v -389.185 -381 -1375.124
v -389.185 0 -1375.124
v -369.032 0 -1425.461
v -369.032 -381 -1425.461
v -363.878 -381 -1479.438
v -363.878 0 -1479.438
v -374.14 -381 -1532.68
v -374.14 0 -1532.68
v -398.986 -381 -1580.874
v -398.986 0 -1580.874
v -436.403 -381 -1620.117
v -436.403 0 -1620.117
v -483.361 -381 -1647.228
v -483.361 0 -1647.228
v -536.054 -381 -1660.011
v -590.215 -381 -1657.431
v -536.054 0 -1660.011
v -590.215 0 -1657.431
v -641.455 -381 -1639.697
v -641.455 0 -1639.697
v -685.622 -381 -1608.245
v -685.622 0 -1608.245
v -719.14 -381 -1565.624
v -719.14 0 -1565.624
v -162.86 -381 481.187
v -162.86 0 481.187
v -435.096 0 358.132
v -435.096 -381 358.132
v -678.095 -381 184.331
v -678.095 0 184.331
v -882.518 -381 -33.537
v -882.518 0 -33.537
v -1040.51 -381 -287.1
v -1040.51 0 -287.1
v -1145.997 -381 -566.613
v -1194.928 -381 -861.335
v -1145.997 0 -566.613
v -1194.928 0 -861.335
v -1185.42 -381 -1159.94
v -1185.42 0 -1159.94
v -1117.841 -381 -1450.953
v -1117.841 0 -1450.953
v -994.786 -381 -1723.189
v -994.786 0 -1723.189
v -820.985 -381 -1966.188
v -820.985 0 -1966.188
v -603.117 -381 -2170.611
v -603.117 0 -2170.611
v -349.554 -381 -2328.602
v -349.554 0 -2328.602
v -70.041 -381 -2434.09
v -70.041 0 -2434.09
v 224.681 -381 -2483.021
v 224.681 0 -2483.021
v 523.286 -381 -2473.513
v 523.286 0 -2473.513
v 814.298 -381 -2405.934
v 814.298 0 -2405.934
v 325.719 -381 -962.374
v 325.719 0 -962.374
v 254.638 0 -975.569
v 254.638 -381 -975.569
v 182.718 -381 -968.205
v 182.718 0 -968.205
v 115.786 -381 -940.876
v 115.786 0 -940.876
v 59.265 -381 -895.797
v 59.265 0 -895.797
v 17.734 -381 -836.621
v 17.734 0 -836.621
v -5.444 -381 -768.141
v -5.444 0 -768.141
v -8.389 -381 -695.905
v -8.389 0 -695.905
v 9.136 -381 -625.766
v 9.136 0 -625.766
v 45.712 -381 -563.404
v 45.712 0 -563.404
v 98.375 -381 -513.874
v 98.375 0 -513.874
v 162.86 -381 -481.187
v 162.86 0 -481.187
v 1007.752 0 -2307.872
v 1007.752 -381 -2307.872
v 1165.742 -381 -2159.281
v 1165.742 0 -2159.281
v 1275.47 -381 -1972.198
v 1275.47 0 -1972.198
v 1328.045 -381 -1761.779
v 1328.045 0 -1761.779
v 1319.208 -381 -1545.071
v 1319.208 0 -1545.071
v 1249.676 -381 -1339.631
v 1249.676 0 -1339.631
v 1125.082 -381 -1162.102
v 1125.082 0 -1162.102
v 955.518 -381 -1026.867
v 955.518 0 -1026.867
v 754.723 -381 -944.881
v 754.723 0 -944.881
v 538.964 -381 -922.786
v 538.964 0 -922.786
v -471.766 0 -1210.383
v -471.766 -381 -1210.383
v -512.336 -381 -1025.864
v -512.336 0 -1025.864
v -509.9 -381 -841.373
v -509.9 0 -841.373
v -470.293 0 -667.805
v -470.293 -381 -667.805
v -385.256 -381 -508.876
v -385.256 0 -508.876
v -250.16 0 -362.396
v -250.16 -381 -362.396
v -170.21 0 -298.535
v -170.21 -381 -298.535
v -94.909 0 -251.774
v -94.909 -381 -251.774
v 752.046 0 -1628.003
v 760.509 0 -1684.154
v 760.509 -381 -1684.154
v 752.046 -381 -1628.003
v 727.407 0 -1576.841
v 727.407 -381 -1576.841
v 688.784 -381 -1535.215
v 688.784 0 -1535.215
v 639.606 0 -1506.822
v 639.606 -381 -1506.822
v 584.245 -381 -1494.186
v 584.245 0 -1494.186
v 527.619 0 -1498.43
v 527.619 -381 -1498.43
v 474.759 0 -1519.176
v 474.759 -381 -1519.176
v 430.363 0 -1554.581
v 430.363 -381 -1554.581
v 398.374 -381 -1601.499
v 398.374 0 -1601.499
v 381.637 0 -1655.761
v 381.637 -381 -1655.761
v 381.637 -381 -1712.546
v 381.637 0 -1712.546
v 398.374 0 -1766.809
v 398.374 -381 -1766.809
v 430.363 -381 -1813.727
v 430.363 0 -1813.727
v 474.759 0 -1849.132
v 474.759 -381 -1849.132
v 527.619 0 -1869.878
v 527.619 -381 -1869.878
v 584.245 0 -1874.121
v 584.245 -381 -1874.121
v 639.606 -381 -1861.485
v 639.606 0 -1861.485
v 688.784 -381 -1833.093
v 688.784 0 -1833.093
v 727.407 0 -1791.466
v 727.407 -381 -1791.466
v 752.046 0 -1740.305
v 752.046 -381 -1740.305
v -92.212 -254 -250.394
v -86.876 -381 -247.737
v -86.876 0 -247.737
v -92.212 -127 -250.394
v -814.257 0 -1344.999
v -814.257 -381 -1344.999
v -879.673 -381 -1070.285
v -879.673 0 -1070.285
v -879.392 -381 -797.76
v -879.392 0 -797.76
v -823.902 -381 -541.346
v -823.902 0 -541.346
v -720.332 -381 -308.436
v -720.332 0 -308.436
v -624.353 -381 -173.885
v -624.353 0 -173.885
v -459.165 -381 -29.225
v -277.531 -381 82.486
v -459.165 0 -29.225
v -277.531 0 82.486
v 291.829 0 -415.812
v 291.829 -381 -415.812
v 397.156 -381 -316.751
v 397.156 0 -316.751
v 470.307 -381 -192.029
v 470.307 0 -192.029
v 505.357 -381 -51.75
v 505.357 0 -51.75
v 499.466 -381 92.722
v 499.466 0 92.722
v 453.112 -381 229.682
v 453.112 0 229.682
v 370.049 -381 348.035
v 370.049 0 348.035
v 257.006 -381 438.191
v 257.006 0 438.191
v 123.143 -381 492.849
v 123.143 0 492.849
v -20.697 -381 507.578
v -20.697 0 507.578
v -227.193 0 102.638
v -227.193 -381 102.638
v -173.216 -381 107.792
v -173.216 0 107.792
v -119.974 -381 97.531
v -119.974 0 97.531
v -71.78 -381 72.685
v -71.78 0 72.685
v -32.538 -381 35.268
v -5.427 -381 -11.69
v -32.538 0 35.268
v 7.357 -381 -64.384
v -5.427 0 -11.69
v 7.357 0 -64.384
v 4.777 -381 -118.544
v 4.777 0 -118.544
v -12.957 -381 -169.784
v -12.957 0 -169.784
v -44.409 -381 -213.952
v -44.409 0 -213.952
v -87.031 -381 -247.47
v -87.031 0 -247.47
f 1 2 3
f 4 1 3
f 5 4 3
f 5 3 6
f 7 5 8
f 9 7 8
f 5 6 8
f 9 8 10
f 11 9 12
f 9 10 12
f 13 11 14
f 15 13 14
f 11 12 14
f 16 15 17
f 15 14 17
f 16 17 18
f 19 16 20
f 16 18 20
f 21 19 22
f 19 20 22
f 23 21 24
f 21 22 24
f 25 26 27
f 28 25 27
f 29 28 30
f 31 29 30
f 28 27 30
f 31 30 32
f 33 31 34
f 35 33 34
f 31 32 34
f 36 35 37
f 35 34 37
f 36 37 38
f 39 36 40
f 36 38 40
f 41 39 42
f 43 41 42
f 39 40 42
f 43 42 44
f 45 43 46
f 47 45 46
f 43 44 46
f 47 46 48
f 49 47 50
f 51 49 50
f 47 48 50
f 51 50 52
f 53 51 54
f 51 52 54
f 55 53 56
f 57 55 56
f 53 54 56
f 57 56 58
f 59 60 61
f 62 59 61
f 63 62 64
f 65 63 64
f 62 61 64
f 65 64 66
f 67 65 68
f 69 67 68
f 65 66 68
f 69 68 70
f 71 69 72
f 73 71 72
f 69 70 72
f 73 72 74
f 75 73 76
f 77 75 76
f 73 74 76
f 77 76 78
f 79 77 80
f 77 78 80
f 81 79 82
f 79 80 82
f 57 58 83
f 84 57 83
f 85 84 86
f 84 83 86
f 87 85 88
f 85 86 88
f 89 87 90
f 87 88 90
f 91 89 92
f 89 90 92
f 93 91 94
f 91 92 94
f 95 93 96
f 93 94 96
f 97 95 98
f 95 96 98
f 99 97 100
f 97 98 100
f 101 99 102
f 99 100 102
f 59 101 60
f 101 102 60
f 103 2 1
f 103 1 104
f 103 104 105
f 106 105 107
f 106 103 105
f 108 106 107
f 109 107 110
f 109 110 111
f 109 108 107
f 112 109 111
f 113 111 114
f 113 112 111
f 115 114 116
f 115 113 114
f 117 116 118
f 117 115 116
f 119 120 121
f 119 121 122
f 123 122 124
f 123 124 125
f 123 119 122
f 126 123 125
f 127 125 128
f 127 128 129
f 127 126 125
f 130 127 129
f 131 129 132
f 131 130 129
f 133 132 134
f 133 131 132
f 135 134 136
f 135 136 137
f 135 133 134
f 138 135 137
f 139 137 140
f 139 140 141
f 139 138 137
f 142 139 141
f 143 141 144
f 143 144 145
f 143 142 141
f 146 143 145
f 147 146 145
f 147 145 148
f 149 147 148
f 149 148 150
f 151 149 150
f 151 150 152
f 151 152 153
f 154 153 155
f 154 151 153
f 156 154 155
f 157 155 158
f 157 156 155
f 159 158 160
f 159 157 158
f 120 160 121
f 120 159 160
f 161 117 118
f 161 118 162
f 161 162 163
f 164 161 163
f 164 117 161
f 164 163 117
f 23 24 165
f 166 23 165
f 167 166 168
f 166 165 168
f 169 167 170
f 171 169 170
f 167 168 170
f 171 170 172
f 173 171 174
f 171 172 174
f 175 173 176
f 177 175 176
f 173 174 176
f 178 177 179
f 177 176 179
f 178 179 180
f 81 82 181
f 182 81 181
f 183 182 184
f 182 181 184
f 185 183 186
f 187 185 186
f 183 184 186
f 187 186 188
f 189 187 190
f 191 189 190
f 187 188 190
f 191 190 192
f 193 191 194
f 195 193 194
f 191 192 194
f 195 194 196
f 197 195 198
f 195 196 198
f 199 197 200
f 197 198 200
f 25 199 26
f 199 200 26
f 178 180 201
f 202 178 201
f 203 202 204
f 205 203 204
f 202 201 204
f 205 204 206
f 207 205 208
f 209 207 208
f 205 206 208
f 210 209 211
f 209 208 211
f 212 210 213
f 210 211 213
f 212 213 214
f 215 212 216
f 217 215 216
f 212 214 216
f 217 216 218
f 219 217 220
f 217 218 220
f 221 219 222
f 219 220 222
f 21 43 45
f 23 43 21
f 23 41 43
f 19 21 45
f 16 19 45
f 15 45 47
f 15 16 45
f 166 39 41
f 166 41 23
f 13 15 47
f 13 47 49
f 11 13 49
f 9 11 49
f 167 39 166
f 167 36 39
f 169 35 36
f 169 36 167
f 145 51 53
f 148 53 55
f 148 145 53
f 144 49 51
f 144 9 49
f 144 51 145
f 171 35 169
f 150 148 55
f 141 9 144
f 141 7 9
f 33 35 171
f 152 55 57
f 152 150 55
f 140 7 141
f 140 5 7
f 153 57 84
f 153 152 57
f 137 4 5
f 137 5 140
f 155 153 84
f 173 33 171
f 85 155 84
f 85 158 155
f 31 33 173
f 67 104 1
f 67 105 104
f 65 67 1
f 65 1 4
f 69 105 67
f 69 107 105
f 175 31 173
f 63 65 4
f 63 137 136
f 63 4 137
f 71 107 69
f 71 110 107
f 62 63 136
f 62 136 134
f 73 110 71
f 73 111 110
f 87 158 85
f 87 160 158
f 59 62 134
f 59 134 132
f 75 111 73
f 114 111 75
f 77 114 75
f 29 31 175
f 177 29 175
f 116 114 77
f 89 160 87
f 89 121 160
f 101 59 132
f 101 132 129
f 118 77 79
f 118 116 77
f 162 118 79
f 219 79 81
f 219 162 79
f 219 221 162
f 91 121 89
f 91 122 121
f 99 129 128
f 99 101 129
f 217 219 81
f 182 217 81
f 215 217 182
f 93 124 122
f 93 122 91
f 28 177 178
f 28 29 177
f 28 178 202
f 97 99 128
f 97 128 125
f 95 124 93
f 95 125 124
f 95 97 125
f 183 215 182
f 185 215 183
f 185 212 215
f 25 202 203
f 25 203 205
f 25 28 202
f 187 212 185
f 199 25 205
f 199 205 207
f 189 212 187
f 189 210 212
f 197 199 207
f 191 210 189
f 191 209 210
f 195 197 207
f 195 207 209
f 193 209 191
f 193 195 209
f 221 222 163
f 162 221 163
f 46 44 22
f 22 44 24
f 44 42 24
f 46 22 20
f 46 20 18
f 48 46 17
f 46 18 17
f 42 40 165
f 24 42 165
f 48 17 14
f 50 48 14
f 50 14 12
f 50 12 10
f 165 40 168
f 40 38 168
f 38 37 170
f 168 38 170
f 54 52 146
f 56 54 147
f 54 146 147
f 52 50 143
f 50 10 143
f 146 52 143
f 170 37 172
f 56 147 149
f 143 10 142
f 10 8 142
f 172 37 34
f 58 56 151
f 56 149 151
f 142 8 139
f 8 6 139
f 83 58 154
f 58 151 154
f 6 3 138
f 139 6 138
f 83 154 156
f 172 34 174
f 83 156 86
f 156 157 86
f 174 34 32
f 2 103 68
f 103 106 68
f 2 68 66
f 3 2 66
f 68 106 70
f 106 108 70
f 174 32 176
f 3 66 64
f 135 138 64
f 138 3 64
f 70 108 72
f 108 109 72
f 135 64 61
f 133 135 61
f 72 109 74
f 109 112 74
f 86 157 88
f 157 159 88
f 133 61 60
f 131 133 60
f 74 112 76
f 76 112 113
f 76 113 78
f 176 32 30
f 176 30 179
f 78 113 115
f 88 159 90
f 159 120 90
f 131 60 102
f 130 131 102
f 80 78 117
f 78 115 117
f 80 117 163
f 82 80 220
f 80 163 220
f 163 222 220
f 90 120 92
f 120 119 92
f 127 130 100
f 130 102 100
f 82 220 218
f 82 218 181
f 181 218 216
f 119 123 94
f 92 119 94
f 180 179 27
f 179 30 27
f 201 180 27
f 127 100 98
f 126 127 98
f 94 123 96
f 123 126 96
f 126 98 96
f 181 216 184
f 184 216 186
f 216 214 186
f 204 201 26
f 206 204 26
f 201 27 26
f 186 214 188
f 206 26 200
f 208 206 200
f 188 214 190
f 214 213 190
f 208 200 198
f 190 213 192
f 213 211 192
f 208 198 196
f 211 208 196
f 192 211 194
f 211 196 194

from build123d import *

# Parameters (mm, degrees)
F0_R     = 190.5
F1_DEPTH = 381


with BuildPart() as f1:
    # F0 (on Front) → F1 (new body)
    with BuildSketch(Plane.XZ):
        with BuildLine():
            ThreePointArc((325.719370356, -962.3735718394), (3.6961348071, -803.2100214685), (162.859685178, -481.1867859197))
            ThreePointArc((162.859685178, -481.1867859197), (481.1867859197, 162.859685178), (-162.859685178, 481.1867859197))
            ThreePointArc((-162.859685178, 481.1867859197), (-1117.8409874031, -1450.9526273733), (814.2984258899, -2405.9339295985))
            ThreePointArc((814.2984258899, -2405.9339295985), (1291.7890770025, -1439.864222952), (325.719370356, -962.3735718394))
        make_face()
        with Locations((570.0088981229, -1684.1537507189)):
            Circle(F0_R, mode=Mode.SUBTRACT)
        with BuildLine():
            Line((-87.030629644, -247.4696010154), (-86.8760860534, -247.7372783663))
            add(Edge.make_bspline(
                [(-94.9094377488, -251.7741435094), (-92.2028370971, -250.3771940912), (-89.5243680445, -249.0310788628), (-86.8760860534, -247.7372783663)],
                knots=[0.9917912061, 0.9917912061, 0.9917912061, 0.9917912061, 1, 1, 1, 1], degree=3))
            add(Edge.make_bspline(
                [(-389.1846004681, -1375.1235718394), (-428.1801974237, -1307.5812166409), (-515.3894424096, -1153.7490842148), (-526.914571938, -791.5365431384), (-406.4471885857, -484.7421461487), (-180.5737375538, -295.9877934602), (-94.9094377488, -251.7741435094)],
                knots=[0, 0, 0, 0, 0.2181948222, 0.476316042, 0.7319816992, 0.9917912061, 0.9917912061, 0.9917912061, 0.9917912061], degree=3))
            ThreePointArc((-389.1846004681, -1375.1235718394), (-458.912439889, -1635.3514112603), (-719.14027931, -1565.6235718394))
            add(Edge.make_bspline(
                [(-719.14027931, -1565.6235718394), (-748.2886752208, -1515.1370691627), (-803.4613477969, -1387.5388500853), (-904.8214060624, -1069.14227852), (-876.6759454634, -604.2402706478), (-650.8800264343, -132.1597502616), (-395.0060096608, 14.6616355507), (-277.530629644, 82.4860778265)],
                knots=[0, 0, 0, 0, 0.1428413796, 0.3302786316, 0.5545765899, 0.7879200788, 1, 1, 1, 1], degree=3))
            ThreePointArc((-277.530629644, 82.4860778265), (-124.3949905718, 99.000670174), (-9.0997030514, -3.1279369353))
            ThreePointArc((-9.0997030514, -3.1279369353), (-0.7881978757, -140.3774006667), (-87.030629644, -247.4696010154))
        make_face(mode=Mode.SUBTRACT)
    extrude(amount=F1_DEPTH)


solid = f1.part
